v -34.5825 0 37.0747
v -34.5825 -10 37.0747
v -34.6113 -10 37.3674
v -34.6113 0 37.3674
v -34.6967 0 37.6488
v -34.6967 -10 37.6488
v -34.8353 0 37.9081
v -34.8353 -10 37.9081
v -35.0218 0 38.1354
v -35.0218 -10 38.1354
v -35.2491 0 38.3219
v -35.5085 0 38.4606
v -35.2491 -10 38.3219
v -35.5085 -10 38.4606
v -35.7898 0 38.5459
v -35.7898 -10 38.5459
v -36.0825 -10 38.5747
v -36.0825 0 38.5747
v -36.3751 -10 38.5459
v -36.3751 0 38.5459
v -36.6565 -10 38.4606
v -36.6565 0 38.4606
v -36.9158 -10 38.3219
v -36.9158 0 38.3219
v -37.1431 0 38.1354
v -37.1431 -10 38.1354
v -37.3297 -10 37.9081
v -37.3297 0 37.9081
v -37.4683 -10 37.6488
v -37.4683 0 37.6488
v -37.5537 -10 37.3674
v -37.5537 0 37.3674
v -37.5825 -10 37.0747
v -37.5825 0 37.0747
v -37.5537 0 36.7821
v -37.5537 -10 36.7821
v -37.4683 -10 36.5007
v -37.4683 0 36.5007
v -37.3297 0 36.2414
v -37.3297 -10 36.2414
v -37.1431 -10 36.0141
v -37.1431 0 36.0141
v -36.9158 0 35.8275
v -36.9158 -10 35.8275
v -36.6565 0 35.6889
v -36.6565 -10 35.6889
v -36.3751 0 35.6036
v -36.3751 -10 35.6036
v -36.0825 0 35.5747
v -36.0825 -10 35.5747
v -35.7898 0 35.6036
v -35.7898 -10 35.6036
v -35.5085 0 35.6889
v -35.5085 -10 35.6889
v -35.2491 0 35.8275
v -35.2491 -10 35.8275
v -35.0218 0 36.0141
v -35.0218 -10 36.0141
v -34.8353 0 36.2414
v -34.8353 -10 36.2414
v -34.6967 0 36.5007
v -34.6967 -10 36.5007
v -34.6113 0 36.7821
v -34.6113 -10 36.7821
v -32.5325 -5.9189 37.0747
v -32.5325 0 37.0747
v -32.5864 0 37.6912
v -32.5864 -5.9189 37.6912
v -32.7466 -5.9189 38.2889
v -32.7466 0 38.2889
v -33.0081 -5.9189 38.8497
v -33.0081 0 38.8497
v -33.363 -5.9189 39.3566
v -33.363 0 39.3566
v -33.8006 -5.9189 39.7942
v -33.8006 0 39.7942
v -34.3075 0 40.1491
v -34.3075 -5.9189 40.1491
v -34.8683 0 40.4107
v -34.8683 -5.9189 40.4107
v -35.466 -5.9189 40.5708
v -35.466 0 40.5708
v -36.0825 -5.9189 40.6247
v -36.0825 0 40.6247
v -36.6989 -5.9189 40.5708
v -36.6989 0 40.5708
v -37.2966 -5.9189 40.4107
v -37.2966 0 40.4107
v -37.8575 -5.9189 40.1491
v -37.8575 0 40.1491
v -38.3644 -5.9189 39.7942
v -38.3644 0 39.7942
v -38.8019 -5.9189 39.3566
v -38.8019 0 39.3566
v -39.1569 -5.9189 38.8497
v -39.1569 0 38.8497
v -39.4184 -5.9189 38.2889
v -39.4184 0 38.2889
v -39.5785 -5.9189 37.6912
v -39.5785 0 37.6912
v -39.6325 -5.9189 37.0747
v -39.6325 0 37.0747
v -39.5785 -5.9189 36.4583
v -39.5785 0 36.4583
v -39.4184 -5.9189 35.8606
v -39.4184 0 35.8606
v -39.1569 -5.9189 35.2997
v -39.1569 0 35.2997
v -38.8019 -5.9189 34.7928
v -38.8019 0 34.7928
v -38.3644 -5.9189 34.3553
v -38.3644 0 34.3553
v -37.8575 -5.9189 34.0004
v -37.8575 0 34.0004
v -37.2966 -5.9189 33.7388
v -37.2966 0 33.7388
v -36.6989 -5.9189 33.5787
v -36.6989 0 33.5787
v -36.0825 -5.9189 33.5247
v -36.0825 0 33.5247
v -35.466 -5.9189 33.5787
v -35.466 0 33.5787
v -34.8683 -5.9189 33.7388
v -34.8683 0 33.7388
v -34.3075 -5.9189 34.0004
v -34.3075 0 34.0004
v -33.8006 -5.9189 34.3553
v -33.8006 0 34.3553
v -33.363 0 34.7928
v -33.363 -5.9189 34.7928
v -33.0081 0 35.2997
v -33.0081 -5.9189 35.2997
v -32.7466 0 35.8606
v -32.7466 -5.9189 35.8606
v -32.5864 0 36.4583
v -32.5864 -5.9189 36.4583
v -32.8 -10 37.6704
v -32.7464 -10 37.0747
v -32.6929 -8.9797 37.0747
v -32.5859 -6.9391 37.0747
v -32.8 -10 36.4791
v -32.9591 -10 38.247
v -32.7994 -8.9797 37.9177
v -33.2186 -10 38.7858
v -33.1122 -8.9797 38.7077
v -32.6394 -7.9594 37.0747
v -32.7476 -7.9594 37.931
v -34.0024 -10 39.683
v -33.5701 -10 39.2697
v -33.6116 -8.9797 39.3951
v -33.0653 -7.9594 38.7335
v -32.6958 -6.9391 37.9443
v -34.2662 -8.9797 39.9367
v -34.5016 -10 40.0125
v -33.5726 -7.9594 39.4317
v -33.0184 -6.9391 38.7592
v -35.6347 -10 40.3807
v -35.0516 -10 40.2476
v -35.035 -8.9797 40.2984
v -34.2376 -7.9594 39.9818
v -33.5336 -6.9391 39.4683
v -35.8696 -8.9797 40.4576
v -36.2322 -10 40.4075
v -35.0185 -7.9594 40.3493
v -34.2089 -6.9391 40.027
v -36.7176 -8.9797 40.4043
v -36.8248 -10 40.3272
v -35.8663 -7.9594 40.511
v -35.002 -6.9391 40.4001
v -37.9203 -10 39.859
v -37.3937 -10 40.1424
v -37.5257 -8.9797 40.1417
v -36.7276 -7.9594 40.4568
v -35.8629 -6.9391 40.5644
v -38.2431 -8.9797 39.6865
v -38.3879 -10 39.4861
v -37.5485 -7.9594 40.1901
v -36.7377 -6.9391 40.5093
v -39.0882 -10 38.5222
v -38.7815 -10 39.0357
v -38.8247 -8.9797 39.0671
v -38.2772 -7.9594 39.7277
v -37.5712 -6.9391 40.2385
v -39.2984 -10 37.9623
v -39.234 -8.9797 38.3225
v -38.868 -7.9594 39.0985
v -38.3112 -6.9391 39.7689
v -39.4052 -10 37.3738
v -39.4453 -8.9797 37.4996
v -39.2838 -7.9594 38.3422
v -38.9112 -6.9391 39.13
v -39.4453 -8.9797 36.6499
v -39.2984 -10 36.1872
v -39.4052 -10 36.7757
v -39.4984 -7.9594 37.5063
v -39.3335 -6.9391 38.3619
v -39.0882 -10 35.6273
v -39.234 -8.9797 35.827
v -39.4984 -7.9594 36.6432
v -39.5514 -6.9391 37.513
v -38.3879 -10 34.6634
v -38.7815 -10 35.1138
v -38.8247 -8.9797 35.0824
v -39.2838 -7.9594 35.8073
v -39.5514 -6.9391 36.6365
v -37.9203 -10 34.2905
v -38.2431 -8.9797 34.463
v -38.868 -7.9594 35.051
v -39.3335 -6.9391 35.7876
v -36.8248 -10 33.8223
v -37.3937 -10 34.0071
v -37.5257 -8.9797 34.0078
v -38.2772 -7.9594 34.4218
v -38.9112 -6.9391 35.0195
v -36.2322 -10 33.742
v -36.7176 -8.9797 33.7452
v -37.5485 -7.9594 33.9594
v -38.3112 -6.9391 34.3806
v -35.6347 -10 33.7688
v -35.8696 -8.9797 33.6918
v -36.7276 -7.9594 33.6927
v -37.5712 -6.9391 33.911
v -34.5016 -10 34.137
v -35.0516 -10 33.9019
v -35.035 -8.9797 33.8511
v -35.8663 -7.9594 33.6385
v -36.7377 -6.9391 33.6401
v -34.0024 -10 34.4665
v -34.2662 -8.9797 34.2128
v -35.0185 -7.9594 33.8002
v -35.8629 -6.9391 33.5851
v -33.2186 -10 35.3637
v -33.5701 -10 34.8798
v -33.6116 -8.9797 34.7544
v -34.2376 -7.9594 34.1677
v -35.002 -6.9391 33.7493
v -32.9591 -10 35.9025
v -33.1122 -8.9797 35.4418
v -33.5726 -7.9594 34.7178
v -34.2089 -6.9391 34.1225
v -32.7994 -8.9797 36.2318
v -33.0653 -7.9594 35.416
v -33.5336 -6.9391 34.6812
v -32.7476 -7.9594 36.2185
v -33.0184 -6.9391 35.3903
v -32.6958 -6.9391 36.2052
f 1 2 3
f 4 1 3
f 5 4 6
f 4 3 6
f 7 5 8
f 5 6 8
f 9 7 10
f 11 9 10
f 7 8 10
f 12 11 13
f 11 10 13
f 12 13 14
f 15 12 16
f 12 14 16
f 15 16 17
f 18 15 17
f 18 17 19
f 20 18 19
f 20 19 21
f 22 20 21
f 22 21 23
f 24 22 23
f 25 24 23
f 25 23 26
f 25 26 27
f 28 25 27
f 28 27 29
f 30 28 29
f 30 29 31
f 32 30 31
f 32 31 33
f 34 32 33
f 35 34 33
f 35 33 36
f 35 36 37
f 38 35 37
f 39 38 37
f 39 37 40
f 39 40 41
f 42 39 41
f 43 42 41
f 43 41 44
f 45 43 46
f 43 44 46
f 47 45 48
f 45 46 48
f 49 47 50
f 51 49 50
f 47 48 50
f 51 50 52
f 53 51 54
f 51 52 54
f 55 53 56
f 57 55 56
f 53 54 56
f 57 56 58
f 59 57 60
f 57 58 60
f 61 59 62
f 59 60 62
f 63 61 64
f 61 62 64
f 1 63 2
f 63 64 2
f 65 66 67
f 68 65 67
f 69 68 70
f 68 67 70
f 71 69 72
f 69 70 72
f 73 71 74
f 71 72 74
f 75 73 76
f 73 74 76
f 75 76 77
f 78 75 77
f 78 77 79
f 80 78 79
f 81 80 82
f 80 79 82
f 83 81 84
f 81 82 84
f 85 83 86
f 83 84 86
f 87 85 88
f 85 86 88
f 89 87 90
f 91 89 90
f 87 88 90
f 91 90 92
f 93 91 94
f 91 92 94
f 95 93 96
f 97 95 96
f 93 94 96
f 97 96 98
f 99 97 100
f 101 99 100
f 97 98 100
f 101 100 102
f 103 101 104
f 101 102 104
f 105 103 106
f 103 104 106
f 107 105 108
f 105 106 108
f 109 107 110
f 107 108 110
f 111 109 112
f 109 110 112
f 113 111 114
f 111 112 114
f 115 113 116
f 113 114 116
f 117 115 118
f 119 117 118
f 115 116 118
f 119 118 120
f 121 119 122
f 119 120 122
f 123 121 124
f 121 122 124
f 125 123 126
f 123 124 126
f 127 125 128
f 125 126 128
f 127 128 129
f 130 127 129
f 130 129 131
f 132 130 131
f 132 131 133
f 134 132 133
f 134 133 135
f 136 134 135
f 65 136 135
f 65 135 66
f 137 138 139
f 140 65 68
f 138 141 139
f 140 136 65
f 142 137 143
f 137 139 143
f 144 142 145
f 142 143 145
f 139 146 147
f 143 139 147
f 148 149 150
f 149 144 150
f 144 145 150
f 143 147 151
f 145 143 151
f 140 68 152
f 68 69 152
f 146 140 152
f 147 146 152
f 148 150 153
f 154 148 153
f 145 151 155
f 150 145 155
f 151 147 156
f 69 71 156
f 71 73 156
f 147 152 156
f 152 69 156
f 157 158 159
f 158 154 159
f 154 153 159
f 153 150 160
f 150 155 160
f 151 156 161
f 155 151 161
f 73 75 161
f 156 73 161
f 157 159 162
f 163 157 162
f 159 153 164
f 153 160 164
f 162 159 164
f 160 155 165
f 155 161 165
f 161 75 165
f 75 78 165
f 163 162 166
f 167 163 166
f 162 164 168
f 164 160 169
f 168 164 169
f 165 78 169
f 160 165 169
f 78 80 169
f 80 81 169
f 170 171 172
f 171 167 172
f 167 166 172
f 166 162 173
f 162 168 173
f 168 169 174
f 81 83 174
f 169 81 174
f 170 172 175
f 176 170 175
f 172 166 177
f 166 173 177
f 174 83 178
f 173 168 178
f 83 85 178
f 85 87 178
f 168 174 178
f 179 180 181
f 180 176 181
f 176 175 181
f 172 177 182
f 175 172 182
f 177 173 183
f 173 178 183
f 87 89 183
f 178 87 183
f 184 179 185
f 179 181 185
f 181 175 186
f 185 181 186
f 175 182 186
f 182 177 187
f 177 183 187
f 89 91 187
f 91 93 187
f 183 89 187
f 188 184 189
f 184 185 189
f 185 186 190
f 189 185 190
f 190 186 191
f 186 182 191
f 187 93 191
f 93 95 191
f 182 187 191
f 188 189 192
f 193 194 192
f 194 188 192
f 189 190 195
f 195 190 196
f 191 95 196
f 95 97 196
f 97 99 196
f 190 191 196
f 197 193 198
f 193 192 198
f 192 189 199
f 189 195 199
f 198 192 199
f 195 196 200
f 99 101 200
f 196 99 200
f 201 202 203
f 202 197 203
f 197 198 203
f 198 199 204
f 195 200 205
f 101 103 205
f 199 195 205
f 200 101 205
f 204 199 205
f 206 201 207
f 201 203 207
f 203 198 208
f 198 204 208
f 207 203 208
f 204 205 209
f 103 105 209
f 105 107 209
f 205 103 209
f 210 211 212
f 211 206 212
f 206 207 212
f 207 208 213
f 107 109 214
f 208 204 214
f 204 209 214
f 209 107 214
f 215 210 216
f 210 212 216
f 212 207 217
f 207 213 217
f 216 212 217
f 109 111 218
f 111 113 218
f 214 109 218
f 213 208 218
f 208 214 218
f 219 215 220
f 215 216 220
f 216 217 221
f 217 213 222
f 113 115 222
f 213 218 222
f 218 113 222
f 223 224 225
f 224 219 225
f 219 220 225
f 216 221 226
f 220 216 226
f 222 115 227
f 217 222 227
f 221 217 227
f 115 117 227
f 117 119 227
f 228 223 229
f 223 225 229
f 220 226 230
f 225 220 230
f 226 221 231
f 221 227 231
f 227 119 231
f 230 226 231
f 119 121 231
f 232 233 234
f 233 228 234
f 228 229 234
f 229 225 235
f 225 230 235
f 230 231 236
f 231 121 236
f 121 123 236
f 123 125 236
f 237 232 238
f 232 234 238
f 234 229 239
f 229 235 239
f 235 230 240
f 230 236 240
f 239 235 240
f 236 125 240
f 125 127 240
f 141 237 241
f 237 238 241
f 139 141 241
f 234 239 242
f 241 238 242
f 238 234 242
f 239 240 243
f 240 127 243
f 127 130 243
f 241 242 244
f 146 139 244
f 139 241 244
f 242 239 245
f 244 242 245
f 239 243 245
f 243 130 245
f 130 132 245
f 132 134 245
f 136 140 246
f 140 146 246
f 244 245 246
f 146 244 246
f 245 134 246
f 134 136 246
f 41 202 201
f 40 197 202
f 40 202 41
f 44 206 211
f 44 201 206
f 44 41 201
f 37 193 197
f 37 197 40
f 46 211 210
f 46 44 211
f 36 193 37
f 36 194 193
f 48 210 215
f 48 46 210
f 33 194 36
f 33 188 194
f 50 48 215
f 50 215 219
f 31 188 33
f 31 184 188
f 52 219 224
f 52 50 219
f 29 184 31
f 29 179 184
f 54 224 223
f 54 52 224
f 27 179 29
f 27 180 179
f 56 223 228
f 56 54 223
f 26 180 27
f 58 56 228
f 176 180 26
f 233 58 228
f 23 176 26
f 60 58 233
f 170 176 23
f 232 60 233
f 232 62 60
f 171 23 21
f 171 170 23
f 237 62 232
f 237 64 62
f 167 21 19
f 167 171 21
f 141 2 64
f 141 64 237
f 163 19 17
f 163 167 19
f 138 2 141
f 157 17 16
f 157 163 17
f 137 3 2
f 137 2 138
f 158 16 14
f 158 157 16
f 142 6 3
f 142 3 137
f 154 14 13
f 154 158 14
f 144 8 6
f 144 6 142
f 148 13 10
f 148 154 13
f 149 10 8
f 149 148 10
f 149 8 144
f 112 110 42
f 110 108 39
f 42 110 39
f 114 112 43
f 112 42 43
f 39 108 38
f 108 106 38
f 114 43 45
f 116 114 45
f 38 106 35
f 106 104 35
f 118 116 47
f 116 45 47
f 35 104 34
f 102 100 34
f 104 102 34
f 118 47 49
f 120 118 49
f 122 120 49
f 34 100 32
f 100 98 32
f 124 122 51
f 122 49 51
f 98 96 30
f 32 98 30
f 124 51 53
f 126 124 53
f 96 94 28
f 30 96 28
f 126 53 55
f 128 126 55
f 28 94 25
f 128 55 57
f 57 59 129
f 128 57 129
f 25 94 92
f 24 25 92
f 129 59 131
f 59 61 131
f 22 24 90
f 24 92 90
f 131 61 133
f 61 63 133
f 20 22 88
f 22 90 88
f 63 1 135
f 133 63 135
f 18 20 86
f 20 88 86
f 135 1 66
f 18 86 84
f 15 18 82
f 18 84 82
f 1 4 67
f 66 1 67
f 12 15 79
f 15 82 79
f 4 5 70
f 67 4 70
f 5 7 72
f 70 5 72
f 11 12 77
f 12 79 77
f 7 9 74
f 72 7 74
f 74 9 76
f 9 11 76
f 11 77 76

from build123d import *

# Parameters (mm, degrees)
F0_R     = 3.55
F1_DEPTH = 25
F2_SIZE2 = 19.0811366877
F2_SIZE  = 1
F3_R     = 4.5061105162
F4_DEPTH = 15
F5_R     = 1.5
F6_DEPTH = 25


with BuildPart() as f1:
    # F0 (on Front) → F1 (new body)
    with BuildSketch(Plane.XZ):
        with Locations((-36.0824763775, 37.0747447014)):
            Circle(F0_R)
    extrude(amount=F1_DEPTH)

    # F2
    f2_edges = [f1.edges().sort_by_distance(p)[0] for p in [
        (-39.632476, -25, 37.074745),
    ]]
    f2_side = f1.faces().sort_by_distance((-36.082476, -25, 37.074745))[0]
    chamfer(f2_edges, length=F2_SIZE, length2=F2_SIZE2, reference=f2_side)

    # F3 (on face) → F4 (cut)
    with BuildSketch(Plane.XZ.offset(25)):
        with Locations((-36.0824763775, 37.0747447014)):
            Circle(F3_R)
    extrude(amount=-F4_DEPTH, mode=Mode.SUBTRACT)

    # F5 (on face) → F6 (cut)
    with BuildSketch(Plane.XZ.offset(10)):
        with Locations((-36.0824763775, 37.0747447014)):
            Circle(F5_R)
    extrude(amount=-F6_DEPTH, mode=Mode.SUBTRACT)


solid = f1.part
